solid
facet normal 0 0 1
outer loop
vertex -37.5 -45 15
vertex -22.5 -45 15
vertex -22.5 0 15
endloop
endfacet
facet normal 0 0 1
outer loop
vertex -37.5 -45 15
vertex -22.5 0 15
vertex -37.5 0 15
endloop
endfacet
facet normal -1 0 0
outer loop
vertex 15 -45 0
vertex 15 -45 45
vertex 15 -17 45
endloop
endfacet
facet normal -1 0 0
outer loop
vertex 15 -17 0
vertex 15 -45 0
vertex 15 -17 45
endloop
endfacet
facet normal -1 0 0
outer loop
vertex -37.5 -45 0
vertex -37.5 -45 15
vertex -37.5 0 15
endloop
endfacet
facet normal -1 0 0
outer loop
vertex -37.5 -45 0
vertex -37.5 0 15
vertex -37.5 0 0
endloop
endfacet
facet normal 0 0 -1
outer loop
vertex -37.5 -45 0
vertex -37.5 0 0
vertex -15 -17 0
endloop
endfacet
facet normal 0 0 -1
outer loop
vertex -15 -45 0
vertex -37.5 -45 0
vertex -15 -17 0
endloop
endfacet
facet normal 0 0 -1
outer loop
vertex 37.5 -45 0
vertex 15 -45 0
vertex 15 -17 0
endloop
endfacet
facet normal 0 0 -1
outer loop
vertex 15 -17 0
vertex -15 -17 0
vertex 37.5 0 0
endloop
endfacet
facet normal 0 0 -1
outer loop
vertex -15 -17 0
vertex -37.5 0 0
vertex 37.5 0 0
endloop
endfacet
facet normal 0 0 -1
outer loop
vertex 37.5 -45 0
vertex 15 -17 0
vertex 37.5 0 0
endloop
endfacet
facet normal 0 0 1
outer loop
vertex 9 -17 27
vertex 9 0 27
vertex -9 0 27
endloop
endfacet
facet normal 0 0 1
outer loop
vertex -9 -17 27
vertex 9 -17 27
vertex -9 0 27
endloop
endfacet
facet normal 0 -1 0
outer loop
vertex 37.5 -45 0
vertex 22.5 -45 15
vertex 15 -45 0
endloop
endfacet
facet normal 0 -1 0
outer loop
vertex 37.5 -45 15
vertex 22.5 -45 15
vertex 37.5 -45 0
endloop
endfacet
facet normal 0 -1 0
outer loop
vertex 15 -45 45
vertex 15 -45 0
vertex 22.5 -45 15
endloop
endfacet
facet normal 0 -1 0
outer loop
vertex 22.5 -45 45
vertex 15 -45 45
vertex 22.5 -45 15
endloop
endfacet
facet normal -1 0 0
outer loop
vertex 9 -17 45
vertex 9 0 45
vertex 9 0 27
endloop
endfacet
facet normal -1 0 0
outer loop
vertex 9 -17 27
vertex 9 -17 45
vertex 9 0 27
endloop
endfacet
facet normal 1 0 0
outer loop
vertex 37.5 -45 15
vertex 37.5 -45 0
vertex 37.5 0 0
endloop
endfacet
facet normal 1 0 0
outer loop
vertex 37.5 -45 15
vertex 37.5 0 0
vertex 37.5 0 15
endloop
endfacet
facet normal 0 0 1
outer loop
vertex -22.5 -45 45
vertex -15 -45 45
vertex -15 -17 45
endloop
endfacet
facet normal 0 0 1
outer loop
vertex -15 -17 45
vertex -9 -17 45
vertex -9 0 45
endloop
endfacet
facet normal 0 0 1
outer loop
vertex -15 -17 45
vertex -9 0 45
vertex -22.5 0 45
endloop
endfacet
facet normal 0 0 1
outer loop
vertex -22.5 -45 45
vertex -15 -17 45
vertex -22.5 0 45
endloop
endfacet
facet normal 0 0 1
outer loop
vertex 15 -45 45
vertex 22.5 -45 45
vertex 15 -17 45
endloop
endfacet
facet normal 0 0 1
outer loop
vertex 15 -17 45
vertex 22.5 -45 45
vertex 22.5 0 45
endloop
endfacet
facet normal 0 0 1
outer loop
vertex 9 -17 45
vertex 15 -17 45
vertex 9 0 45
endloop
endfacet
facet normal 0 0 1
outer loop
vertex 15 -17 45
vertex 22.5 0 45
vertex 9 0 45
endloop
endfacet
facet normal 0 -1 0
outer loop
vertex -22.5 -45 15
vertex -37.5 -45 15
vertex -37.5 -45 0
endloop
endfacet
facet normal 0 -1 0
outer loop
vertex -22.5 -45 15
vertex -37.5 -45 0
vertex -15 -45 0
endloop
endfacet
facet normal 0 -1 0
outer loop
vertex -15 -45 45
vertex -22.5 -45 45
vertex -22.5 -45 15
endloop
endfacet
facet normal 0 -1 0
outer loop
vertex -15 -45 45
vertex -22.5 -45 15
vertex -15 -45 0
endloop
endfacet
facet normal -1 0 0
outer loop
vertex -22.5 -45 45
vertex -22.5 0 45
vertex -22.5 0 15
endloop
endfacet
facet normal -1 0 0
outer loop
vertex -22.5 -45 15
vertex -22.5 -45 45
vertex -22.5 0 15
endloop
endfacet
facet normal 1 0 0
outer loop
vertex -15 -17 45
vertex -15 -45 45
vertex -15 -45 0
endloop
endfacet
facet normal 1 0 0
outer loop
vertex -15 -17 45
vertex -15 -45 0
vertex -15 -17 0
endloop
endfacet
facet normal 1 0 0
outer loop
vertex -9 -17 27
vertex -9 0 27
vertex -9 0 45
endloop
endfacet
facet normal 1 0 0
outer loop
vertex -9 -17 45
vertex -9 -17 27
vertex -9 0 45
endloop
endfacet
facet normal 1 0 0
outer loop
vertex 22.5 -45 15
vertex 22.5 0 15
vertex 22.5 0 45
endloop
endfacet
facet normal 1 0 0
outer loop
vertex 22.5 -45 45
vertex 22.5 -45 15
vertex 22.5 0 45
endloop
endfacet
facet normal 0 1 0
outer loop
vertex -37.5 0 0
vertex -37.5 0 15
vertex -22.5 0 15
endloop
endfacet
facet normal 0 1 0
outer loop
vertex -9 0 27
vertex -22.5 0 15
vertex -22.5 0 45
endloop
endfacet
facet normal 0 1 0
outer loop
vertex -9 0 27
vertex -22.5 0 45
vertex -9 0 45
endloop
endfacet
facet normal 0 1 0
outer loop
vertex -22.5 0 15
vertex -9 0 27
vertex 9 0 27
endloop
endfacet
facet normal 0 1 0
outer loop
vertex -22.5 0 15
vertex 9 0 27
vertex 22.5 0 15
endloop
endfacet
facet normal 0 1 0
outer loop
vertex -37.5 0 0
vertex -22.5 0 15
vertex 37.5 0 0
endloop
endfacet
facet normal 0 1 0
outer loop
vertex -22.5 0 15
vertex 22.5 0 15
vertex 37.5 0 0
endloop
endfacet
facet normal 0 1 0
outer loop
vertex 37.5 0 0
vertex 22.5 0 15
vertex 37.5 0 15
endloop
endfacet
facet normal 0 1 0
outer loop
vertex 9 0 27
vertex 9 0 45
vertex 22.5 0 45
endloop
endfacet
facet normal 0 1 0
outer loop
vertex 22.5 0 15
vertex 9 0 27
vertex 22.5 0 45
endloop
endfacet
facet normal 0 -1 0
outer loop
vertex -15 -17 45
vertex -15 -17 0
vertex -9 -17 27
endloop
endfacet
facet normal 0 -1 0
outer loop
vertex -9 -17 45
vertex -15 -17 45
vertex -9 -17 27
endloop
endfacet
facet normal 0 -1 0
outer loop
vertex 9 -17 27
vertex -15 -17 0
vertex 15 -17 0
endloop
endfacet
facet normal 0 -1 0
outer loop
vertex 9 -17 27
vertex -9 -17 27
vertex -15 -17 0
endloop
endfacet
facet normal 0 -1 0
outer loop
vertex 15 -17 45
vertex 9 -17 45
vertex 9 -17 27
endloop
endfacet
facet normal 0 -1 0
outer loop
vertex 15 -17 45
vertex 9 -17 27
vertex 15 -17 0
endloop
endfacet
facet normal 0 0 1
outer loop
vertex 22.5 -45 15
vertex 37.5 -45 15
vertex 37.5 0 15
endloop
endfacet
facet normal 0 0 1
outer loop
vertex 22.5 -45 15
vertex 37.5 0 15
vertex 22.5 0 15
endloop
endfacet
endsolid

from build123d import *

# Parameters (mm, degrees)
F1_DEPTH = 45
F2_W     = 30
F2_H     = 28
F3_DEPTH = 45.001


with BuildPart() as f1:
    # F0 (on Front) → F1 (new body)
    with BuildSketch(Plane.XZ):
        Polygon((-37.5, 0), (0, 0), (37.5, 0), (37.5, 15), (22.5, 15), (22.5, 45), (9, 45), (9, 27), (-9, 27), (-9, 45), (-22.5, 45), (-22.5, 15), (-37.5, 15), align=None)
    extrude(amount=F1_DEPTH)

    # F2 (on face) → F3 (cut, through all)
    with BuildSketch(Plane.XY.offset(45)):
        with Locations((0, -31)):
            Rectangle(F2_W, F2_H)
    extrude(amount=-F3_DEPTH, mode=Mode.SUBTRACT)


solid = f1.part
